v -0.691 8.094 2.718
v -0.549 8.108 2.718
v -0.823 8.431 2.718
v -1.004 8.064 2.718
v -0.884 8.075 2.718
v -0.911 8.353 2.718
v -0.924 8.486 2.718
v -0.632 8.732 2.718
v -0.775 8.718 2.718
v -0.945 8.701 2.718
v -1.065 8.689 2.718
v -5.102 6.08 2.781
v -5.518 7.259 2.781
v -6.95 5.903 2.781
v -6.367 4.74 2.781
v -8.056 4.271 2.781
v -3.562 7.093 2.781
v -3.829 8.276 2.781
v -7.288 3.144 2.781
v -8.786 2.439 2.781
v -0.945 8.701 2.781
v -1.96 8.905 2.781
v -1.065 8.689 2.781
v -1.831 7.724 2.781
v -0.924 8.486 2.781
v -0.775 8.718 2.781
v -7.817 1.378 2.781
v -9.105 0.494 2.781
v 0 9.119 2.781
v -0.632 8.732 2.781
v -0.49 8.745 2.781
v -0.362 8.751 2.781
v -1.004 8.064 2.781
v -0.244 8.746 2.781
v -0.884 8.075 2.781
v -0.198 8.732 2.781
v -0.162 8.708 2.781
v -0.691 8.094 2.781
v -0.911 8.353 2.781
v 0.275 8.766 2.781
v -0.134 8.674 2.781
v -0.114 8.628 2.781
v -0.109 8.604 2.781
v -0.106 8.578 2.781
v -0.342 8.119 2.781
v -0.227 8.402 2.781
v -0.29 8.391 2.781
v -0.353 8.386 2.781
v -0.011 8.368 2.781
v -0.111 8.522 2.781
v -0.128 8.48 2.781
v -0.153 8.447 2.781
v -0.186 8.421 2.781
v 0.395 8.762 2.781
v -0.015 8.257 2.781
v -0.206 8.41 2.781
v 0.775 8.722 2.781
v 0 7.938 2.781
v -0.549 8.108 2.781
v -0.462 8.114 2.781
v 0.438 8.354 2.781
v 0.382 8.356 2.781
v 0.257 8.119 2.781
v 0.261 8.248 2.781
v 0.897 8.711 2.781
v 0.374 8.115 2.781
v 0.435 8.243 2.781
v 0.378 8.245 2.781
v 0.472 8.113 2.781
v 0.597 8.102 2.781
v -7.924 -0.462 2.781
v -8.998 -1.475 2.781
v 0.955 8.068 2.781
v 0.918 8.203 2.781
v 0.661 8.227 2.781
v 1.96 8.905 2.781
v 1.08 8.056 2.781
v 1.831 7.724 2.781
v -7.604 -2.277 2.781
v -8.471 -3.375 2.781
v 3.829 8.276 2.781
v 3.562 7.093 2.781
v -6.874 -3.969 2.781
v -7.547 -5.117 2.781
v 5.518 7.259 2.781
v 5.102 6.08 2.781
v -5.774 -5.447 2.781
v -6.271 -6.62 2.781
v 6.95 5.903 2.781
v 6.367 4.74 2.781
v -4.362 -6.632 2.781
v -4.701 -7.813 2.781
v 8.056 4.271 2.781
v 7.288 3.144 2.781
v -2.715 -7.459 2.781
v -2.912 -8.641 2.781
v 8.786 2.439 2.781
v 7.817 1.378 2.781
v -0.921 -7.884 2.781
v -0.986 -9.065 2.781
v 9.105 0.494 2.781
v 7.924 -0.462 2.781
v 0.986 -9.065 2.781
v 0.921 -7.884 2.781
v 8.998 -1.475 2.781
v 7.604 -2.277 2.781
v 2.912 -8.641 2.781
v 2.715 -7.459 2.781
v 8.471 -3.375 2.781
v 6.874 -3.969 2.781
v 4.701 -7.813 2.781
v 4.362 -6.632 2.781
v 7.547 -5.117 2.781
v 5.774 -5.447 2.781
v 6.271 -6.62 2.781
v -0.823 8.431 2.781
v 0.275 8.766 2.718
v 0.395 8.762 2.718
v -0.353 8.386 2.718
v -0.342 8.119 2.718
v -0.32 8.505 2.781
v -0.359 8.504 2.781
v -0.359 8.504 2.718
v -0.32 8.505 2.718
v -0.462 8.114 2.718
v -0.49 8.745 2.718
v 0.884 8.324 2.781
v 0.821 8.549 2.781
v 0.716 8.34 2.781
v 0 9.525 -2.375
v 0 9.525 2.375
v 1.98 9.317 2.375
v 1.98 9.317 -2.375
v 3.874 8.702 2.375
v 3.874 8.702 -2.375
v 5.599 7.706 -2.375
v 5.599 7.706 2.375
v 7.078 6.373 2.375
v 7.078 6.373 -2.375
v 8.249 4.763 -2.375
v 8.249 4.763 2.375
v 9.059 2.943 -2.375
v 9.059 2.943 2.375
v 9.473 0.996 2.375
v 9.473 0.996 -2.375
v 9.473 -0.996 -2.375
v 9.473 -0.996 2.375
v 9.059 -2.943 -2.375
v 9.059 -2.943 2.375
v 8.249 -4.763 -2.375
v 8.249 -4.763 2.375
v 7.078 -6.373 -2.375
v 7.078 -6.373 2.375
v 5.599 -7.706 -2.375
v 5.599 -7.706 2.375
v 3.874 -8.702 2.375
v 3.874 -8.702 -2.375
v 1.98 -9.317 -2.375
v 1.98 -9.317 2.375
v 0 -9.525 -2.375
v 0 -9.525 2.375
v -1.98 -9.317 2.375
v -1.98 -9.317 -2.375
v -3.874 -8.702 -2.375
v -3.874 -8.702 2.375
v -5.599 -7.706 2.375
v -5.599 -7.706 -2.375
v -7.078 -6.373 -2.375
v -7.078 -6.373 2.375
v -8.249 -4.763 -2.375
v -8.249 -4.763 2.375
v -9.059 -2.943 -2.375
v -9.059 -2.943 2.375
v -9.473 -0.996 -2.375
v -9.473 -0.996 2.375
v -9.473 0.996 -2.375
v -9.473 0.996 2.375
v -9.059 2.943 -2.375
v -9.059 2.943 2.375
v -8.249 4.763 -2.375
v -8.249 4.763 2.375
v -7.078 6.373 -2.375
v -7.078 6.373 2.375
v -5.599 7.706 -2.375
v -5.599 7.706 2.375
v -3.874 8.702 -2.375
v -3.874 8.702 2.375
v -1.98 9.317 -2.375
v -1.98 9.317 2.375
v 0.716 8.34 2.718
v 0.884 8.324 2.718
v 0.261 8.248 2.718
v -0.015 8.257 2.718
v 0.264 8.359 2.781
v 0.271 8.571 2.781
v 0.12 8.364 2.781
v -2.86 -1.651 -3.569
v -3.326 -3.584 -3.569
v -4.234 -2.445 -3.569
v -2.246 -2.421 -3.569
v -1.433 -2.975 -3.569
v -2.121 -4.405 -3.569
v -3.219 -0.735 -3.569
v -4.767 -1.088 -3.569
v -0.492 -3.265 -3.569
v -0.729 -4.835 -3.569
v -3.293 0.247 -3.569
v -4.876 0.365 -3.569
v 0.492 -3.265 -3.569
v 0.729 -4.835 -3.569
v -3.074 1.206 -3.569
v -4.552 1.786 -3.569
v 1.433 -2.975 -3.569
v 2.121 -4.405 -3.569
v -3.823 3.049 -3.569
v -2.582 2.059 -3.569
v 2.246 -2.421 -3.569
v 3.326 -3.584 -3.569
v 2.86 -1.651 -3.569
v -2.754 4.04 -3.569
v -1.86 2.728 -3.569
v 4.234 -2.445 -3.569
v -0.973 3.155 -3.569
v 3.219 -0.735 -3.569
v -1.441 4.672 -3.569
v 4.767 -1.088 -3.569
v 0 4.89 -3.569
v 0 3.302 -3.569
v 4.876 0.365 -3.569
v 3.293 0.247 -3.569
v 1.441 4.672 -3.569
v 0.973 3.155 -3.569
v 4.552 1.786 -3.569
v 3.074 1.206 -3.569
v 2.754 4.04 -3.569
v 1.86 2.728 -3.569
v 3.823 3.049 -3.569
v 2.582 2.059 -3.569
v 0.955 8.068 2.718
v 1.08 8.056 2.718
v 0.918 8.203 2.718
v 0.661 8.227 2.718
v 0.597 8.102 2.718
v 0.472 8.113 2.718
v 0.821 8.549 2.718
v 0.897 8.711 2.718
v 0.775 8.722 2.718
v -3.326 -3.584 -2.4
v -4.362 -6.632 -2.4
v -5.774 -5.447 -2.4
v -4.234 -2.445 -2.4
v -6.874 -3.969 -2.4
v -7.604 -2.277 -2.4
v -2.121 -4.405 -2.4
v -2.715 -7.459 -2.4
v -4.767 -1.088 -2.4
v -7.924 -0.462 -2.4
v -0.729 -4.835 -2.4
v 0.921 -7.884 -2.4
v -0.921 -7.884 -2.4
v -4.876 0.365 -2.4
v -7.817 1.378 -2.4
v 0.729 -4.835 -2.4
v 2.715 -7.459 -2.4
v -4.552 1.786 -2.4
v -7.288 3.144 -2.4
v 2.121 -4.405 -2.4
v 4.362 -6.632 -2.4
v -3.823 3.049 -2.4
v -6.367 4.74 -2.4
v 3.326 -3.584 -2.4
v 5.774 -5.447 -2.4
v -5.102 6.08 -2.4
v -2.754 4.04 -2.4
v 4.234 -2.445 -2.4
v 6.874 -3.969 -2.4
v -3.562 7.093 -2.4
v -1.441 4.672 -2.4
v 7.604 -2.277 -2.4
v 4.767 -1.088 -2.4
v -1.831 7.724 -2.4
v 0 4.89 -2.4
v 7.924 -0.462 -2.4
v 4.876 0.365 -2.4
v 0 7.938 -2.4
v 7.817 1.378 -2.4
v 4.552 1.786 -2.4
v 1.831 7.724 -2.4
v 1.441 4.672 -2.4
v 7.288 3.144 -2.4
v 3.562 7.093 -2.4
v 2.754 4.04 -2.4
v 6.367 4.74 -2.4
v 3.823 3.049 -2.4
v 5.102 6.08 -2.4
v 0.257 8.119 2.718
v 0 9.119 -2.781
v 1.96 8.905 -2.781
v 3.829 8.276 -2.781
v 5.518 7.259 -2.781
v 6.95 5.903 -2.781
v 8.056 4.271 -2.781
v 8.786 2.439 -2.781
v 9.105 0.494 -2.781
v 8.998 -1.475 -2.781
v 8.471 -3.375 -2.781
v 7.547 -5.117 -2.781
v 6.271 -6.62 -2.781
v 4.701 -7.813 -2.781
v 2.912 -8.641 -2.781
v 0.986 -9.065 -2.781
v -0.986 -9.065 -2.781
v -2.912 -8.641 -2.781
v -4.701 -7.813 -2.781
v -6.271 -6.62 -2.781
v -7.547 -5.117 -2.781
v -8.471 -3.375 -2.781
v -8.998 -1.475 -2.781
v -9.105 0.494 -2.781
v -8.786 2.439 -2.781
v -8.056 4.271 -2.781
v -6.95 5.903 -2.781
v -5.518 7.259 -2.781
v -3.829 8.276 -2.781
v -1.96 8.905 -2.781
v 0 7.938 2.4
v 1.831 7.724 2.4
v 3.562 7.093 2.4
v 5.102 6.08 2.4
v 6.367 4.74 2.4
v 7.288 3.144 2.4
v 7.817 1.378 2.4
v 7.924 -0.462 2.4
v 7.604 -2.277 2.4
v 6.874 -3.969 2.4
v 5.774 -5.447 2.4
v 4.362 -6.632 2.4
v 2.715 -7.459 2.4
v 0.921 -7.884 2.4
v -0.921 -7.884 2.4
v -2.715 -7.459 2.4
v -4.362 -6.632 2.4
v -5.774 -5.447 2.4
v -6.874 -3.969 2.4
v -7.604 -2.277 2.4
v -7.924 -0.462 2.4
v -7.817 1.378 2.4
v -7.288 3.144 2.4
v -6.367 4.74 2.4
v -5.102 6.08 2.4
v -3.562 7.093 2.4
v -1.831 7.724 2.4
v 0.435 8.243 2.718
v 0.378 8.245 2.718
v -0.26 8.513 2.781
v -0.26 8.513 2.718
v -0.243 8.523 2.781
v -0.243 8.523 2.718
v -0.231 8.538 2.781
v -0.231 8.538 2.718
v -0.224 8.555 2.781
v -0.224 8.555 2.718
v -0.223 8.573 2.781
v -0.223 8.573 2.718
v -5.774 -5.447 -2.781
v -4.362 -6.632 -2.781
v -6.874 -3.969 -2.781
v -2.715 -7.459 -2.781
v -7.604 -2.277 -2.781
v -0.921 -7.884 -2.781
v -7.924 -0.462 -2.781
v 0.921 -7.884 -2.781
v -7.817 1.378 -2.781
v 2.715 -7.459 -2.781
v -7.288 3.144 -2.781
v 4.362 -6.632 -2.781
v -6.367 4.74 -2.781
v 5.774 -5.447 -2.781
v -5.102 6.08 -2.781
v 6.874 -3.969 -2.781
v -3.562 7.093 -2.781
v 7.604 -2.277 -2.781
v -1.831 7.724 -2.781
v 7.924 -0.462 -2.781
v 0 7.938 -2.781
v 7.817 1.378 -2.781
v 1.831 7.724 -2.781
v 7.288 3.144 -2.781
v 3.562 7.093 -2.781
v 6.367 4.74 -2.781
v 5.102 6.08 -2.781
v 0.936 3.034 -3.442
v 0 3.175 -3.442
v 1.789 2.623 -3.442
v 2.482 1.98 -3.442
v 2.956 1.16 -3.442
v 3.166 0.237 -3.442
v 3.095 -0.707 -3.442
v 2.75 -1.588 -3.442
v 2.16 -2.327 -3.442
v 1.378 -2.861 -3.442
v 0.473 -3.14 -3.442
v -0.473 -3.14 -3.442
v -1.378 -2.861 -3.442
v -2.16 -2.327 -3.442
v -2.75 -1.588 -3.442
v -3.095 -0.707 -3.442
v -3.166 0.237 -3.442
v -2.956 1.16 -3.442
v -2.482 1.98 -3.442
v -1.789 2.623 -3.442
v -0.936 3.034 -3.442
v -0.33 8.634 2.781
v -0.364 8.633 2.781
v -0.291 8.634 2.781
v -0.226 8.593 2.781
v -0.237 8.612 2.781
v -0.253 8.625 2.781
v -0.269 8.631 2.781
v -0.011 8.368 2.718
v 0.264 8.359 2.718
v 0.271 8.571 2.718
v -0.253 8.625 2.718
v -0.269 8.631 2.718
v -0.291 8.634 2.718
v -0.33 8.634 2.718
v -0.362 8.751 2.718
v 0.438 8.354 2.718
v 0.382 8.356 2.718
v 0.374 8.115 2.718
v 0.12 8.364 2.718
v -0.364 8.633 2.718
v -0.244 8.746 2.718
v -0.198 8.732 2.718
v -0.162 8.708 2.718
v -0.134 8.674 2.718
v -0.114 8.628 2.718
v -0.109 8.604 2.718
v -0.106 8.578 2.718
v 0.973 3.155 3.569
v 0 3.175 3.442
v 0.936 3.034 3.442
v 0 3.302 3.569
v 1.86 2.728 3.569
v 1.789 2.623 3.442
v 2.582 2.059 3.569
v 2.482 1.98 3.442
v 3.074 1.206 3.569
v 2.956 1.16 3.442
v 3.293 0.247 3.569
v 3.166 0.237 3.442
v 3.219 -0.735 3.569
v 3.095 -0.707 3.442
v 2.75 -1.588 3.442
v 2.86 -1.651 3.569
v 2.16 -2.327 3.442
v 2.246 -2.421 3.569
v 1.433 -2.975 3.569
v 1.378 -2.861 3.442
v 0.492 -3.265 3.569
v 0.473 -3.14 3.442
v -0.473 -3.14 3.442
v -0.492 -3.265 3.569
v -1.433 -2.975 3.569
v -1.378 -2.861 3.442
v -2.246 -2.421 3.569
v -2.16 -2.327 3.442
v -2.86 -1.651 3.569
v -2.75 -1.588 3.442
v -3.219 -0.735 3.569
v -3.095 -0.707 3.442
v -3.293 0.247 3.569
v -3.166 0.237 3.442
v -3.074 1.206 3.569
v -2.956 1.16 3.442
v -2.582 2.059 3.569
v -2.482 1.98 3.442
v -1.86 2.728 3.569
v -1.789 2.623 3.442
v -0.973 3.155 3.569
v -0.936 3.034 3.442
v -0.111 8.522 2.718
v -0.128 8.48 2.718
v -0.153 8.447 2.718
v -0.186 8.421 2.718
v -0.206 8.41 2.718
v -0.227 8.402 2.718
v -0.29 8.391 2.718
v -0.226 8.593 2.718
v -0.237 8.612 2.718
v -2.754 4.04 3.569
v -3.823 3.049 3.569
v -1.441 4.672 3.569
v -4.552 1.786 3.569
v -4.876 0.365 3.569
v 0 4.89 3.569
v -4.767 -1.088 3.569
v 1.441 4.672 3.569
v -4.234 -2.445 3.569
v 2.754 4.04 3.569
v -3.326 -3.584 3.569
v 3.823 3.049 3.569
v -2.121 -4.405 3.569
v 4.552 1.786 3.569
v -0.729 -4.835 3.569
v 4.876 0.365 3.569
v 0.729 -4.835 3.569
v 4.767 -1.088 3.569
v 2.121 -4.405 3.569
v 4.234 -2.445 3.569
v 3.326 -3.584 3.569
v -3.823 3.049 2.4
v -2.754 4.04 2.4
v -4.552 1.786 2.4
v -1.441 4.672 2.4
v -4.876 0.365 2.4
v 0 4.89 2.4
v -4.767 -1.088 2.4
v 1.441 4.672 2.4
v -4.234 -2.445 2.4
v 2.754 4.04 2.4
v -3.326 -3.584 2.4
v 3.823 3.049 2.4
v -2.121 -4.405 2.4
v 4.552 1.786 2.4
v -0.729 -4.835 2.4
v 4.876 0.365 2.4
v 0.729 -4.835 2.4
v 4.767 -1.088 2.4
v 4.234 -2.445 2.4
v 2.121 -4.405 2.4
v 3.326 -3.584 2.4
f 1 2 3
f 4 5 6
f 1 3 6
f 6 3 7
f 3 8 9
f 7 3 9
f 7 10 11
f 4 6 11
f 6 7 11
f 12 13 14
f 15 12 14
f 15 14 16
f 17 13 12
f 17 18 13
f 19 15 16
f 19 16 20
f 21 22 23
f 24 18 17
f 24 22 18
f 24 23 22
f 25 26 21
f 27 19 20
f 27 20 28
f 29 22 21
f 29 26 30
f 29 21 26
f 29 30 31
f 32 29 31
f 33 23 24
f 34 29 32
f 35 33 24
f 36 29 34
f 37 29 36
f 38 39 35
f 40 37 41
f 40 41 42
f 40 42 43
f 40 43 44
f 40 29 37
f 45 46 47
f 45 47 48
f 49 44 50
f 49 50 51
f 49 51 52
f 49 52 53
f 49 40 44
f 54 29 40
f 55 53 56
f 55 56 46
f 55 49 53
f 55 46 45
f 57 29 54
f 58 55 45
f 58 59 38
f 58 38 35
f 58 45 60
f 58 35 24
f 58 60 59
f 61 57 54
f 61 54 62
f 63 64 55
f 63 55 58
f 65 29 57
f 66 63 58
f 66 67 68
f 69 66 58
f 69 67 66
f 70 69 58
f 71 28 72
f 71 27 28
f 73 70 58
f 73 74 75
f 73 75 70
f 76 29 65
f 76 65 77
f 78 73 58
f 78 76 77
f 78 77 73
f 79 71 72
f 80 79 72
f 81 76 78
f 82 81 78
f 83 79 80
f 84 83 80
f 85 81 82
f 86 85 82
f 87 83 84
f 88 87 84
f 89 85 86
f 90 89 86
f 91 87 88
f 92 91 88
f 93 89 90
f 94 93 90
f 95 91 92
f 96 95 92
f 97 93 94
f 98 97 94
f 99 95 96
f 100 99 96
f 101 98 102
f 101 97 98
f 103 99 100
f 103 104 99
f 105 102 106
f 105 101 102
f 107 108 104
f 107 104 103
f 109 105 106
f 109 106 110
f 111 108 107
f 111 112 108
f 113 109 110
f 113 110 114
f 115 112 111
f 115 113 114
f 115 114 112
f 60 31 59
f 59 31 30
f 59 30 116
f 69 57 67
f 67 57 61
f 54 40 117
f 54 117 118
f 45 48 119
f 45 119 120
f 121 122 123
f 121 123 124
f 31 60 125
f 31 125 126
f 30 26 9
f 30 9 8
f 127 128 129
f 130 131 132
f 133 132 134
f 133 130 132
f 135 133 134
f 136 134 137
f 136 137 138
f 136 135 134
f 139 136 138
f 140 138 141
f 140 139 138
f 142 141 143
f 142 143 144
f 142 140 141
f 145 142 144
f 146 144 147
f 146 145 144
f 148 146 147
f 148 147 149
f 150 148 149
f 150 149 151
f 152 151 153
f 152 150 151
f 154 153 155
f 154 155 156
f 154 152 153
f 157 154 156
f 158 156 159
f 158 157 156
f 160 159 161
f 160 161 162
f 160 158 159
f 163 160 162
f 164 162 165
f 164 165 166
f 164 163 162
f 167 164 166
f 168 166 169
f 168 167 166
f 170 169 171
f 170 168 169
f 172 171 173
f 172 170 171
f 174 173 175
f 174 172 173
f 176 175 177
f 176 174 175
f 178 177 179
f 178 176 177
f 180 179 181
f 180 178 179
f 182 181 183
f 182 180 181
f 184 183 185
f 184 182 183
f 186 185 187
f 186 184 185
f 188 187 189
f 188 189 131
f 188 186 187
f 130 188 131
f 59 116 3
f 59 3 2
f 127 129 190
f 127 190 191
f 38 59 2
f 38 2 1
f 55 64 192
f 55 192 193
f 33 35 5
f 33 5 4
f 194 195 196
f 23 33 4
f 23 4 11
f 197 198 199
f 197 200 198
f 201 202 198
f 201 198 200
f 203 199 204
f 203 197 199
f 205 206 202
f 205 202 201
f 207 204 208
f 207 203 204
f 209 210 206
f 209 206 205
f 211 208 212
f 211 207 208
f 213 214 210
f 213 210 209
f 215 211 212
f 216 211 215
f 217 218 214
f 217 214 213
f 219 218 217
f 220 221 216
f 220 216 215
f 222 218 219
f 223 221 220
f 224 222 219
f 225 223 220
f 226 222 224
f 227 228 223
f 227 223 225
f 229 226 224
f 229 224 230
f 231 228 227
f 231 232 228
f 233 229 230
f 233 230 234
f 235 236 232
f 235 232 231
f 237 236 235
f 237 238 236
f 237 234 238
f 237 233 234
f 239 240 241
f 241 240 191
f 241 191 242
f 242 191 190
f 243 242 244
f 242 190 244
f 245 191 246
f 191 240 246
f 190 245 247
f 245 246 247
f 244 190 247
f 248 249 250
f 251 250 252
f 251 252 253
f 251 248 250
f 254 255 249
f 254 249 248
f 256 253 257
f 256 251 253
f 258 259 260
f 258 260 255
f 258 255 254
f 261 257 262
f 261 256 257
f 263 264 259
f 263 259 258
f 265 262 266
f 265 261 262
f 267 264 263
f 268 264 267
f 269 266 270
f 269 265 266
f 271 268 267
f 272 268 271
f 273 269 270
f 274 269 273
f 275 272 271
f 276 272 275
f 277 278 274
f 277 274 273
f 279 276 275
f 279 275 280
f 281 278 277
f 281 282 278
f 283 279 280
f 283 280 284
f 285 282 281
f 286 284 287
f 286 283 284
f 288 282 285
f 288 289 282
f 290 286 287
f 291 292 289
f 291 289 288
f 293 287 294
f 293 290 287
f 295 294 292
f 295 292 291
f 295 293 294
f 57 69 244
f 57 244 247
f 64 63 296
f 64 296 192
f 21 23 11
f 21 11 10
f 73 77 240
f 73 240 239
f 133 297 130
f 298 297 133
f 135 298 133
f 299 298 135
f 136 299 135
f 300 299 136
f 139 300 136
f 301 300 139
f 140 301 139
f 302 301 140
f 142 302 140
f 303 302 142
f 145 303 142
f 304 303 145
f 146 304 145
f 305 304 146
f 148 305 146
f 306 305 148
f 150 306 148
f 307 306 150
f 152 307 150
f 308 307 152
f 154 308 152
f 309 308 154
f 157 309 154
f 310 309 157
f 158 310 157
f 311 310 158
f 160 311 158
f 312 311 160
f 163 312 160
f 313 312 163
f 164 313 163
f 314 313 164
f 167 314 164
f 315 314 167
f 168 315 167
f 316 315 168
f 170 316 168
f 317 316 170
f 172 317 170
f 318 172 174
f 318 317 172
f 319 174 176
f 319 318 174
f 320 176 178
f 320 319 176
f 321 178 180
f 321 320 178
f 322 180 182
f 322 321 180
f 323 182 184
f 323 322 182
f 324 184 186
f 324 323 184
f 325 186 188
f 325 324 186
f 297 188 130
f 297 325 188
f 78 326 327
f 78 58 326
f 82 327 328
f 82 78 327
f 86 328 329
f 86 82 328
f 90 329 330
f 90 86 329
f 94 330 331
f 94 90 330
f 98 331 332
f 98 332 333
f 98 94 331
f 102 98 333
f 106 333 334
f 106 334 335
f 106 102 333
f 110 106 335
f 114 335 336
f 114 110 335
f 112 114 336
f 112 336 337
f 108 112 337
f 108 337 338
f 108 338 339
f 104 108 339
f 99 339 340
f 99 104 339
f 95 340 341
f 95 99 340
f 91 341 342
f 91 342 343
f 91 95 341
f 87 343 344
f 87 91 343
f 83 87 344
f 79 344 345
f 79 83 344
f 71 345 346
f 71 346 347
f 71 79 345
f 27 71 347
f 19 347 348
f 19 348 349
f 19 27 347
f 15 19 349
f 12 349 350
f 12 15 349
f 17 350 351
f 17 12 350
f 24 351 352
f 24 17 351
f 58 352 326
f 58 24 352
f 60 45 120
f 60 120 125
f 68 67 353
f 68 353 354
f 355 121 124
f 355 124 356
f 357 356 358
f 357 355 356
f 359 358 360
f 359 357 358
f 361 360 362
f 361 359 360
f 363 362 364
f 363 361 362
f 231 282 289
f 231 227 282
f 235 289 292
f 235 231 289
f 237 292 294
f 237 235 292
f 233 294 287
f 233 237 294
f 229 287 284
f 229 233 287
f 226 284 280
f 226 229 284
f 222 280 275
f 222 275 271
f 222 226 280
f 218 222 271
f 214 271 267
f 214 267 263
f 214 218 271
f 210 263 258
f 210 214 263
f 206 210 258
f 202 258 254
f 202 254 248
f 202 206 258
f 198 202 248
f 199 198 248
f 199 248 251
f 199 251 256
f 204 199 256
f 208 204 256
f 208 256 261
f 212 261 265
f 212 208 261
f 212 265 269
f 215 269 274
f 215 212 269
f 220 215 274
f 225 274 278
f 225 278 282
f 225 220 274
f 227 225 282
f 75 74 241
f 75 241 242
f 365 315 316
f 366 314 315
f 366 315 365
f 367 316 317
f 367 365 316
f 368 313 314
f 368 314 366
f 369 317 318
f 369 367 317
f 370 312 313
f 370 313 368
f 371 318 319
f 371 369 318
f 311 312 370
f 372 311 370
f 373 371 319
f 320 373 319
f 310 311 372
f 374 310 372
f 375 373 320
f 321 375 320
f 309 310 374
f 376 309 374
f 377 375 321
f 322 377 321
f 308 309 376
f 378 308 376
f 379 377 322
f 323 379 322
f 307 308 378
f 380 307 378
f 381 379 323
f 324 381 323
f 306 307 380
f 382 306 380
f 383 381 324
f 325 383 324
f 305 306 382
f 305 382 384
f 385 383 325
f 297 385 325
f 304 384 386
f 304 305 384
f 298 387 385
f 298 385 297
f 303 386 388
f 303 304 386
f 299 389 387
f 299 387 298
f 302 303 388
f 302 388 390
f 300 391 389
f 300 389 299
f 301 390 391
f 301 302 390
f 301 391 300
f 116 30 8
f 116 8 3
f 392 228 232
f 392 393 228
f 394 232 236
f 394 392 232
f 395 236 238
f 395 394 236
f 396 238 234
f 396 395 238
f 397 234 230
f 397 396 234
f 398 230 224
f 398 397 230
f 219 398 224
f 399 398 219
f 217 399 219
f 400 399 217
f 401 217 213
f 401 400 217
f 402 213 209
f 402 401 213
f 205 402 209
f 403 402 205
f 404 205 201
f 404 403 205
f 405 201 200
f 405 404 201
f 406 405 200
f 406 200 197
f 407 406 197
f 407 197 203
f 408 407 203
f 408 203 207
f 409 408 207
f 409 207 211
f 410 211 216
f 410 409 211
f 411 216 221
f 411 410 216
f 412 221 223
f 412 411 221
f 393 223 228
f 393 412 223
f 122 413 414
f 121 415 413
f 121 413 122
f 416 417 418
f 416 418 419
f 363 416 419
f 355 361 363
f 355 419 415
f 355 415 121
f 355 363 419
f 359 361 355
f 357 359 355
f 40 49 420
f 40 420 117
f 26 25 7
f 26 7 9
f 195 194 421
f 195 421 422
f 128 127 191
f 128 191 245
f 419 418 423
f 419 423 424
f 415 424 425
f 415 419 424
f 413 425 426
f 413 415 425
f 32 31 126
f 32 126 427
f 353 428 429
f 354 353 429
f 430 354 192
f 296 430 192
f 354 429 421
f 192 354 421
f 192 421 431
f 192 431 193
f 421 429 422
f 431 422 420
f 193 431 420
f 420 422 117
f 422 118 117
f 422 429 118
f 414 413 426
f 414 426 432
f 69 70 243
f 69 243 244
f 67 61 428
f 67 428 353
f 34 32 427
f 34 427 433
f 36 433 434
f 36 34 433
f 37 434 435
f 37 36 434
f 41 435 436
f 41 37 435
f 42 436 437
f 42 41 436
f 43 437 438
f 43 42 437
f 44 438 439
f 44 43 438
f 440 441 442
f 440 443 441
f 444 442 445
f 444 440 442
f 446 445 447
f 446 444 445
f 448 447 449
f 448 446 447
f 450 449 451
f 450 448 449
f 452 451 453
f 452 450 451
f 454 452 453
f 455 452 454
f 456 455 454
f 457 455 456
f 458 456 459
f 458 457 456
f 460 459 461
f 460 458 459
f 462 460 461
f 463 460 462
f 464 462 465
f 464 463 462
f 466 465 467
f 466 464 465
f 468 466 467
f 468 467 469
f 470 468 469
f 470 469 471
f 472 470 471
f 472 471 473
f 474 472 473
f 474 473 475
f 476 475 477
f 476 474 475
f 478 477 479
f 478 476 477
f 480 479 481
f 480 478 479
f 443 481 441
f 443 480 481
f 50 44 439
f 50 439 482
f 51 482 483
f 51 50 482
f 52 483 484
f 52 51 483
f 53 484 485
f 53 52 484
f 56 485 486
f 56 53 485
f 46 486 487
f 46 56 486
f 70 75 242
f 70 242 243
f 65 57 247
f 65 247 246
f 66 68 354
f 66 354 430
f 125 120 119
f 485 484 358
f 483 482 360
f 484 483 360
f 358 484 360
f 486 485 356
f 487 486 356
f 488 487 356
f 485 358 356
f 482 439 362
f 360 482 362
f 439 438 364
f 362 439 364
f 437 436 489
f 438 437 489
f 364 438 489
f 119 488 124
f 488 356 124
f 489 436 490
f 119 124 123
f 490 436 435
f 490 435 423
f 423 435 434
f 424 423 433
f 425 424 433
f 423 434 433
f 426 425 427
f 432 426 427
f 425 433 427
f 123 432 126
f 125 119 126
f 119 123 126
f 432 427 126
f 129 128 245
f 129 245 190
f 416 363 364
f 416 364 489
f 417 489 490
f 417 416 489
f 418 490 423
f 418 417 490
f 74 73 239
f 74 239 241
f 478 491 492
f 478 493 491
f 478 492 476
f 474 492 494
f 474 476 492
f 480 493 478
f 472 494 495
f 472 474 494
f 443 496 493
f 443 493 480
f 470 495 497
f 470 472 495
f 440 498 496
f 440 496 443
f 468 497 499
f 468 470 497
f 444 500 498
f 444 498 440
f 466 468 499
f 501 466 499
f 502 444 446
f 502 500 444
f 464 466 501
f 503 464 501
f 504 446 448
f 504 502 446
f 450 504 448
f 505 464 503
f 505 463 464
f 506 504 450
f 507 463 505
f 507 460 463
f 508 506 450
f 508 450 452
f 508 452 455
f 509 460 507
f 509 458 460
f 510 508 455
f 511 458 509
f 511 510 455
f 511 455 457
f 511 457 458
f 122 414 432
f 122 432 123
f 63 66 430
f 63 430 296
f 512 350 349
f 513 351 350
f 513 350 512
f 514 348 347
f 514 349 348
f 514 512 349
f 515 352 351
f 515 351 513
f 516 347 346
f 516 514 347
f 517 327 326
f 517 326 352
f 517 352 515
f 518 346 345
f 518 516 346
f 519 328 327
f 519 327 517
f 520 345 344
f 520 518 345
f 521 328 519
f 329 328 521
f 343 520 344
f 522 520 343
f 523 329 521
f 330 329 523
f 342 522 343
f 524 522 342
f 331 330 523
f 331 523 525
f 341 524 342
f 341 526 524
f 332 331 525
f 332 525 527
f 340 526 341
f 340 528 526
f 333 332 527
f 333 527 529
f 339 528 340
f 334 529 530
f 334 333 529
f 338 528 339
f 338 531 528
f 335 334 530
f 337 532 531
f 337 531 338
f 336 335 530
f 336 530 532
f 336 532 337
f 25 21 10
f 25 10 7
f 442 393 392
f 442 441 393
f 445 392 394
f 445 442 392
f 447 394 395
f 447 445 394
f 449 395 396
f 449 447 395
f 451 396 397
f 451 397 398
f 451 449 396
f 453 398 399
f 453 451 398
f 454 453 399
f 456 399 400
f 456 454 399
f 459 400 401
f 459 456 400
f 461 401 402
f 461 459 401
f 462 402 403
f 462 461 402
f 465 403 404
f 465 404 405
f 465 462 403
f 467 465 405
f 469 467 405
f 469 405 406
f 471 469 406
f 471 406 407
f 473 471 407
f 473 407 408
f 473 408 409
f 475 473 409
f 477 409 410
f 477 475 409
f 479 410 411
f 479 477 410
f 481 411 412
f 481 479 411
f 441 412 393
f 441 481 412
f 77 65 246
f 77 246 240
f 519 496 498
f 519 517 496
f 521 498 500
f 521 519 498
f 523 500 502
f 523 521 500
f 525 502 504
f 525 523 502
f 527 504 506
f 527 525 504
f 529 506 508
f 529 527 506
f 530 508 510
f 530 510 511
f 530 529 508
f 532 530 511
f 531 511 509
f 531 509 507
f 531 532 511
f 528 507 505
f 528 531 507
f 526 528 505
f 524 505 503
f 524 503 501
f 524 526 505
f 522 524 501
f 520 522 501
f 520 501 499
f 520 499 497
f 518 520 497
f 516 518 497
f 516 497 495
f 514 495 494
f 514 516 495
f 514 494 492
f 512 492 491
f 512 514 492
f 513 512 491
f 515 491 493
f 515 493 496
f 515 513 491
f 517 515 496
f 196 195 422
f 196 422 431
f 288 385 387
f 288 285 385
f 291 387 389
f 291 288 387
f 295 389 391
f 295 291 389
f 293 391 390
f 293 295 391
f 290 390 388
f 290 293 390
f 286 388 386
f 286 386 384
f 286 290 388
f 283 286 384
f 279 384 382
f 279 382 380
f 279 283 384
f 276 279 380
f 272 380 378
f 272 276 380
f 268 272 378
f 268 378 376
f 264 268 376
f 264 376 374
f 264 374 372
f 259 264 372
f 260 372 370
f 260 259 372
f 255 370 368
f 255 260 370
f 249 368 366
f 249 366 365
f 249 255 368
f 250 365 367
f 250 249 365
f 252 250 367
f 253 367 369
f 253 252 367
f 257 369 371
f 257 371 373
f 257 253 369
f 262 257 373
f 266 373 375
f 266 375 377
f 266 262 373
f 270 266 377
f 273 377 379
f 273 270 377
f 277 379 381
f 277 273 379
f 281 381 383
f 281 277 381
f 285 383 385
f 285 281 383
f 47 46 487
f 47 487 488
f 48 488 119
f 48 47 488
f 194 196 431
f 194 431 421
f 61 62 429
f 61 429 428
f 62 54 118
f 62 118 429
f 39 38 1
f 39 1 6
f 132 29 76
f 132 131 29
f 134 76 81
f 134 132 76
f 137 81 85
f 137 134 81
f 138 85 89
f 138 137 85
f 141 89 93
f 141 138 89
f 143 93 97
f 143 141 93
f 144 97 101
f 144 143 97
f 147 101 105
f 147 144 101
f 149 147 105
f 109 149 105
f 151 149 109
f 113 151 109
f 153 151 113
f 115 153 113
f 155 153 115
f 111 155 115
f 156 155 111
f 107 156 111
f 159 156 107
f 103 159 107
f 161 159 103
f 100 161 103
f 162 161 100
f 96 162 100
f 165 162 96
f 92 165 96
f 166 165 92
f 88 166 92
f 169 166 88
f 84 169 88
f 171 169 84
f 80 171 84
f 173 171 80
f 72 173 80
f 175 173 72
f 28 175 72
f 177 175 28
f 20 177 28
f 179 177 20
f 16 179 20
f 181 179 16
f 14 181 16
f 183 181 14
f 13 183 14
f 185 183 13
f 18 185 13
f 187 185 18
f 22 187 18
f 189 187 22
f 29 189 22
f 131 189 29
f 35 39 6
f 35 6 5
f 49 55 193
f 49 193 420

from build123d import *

# Parameters (mm, degrees)
CUT_EXTRUDE1_DEPTH = 0.0635


with BuildPart() as part:
    # Sketch1 → Revolve1 (revolve)
    with BuildSketch(Plane(origin=(0, 0, 0), x_dir=(0, 0, -1), z_dir=(1, 0, 0))):
        Polygon((-3.5687, 3.302), (-3.5687, 4.8895), (-2.4003, 4.8895), (-2.4003, 7.9375), (-2.7813, 7.9375), (-2.7813, 9.1186), (-2.3749, 9.525), (2.3749, 9.525), (2.7813, 9.1186), (2.7813, 7.9375), (2.4003, 7.9375), (2.4003, 4.8895), (3.5687, 4.8895), (3.5687, 3.302), (3.4417, 3.175), (-3.4417, 3.175), align=None)
    revolve(axis=Axis((0, 0, 0), (0, 0, -1)))

    # Sketch2 → Cut-Extrude1 (cut)
    with BuildSketch(Plane.XY.offset(2.7813)):
        Polygon((-1.065389716, 8.689257304), (-0.944927977, 8.700960028), (-0.923812192, 8.485731663), (-0.775238474, 8.71762369), (-0.6318801, 8.731743282), (-0.823194203, 8.43116135), (-0.549325012, 8.108064395), (-0.690520926, 8.094199211), (-0.910837432, 8.352931182), (-0.883615878, 8.075245886), (-1.004077616, 8.063543161), align=None)
        with BuildLine():
            Line((-0.489550779, 8.745205417), (-0.362092846, 8.750802372))
            add(Edge.make_bspline(
                [(-0.362092846, 8.750802372), (-0.353783496, 8.751094885), (-0.337719442, 8.751660387), (-0.314512555, 8.751859917), (-0.293097259, 8.751130036), (-0.273426615, 8.750177126), (-0.25557832, 8.748042626), (-0.239408839, 8.745617462), (-0.225080822, 8.742341467), (-0.212298345, 8.738378299), (-0.200823557, 8.733485202), (-0.189914069, 8.728251603), (-0.179779185, 8.721890908), (-0.169997559, 8.715093426), (-0.160982847, 8.707235014), (-0.152469707, 8.698745309), (-0.144499674, 8.68948952), (-0.137163657, 8.679508609), (-0.130573946, 8.668808831), (-0.124668367, 8.657561061), (-0.119619418, 8.645720508), (-0.115250492, 8.633375845), (-0.111835881, 8.620431699), (-0.109185181, 8.606920008), (-0.107217999, 8.592822714), (-0.106684397, 8.583196649), (-0.106413759, 8.578314391)],
                knots=[0, 0, 0, 0, 2.4944e-05, 4.8222e-05, 6.9602e-05, 8.9225e-05, 0.000107275, 0.000123504, 0.000138253, 0.000151328, 0.000163588, 0.000175649, 0.000187582, 0.000199441, 0.000211348, 0.000223401, 0.000235488, 0.000247954, 0.000260521, 0.000273152, 0.00028603, 0.000299104, 0.000312403, 0.000326149, 0.000340397, 0.00035506, 0.00035506, 0.00035506, 0.00035506], degree=3))
            add(Edge.make_bspline(
                [(-0.106413759, 8.578314391), (-0.106301145, 8.57292907), (-0.106079291, 8.562319767), (-0.106956067, 8.546709533), (-0.108985222, 8.531734852), (-0.112150836, 8.517427274), (-0.116516958, 8.503788963), (-0.121841952, 8.490732201), (-0.128357362, 8.47833375), (-0.136015471, 8.466683627), (-0.144501712, 8.455688158), (-0.154040626, 8.445647342), (-0.164159304, 8.436201955), (-0.175157805, 8.427603876), (-0.187090246, 8.420035009), (-0.19964346, 8.412982658), (-0.213097771, 8.406836734), (-0.222481909, 8.403469396), (-0.227257109, 8.401755898)],
                knots=[0, 0, 0, 0, 1.6155e-05, 3.1827e-05, 4.6848e-05, 6.1445e-05, 7.5727e-05, 8.9758e-05, 0.000103699, 0.00011767, 0.000131538, 0.000145307, 0.000159169, 0.000173037, 0.000187115, 0.000201521, 0.000216207, 0.000231422, 0.000231422, 0.000231422, 0.000231422], degree=3))
            add(Edge.make_bspline(
                [(-0.227257109, 8.401755898), (-0.230428994, 8.40083463), (-0.237276115, 8.398845897), (-0.248567522, 8.396319688), (-0.261647847, 8.394081399), (-0.276541992, 8.392071054), (-0.293213358, 8.390303809), (-0.3117114, 8.388833395), (-0.331976204, 8.387396251), (-0.346105902, 8.38671699), (-0.353443006, 8.386364271)],
                knots=[0, 0, 0, 0, 9.907e-06, 2.1387e-05, 3.4687e-05, 4.9708e-05, 6.6467e-05, 8.4975e-05, 0.000105375, 0.000127411, 0.000127411, 0.000127411, 0.000127411], degree=3))
            Line((-0.353443006, 8.386364271), (-0.341740282, 8.118855257))
            Line((-0.341740282, 8.118855257), (-0.461947614, 8.113639912))
            Line((-0.461947614, 8.113639912), (-0.489550779, 8.745205417))
        make_face()
        with BuildLine():
            Line((-0.358531147, 8.503518718), (-0.32037009, 8.505172364))
            add(Edge.make_bspline(
                [(-0.32037009, 8.505172364), (-0.313456644, 8.505592798), (-0.300711051, 8.506367909), (-0.283338162, 8.508066241), (-0.269442305, 8.510743628), (-0.258483675, 8.513806757), (-0.249827521, 8.518175494), (-0.242563252, 8.523364305), (-0.236339925, 8.529632522), (-0.231078239, 8.53675751), (-0.227040183, 8.54486288), (-0.224012592, 8.553649742), (-0.222695566, 8.563264025), (-0.222683841, 8.569831817), (-0.222677782, 8.57322625)],
                knots=[0, 0, 0, 0, 2.0781e-05, 3.8312e-05, 5.2308e-05, 6.3212e-05, 7.2314e-05, 8.1246e-05, 8.9881e-05, 9.8709e-05, 0.000107697, 0.000116949, 0.000126466, 0.000136645, 0.000136645, 0.000136645, 0.000136645], degree=3))
            add(Edge.make_bspline(
                [(-0.222677782, 8.57322625), (-0.222917637, 8.576158471), (-0.22338335, 8.581851802), (-0.224998846, 8.590031341), (-0.227597902, 8.59754684), (-0.23099774, 8.604406251), (-0.235304004, 8.610636746), (-0.240375218, 8.61626779), (-0.246452189, 8.62116902), (-0.251005053, 8.62378647), (-0.253333831, 8.625125289)],
                knots=[0, 0, 0, 0, 8.822e-06, 1.7129e-05, 2.4933e-05, 3.2613e-05, 4.0023e-05, 4.7587e-05, 5.5275e-05, 6.3325e-05, 6.3325e-05, 6.3325e-05, 6.3325e-05], degree=3))
            add(Edge.make_bspline(
                [(-0.253333831, 8.625125289), (-0.255266589, 8.626057529), (-0.259374974, 8.628039155), (-0.266333987, 8.630303419), (-0.274399852, 8.632008988), (-0.283527412, 8.633423979), (-0.293729577, 8.634232301), (-0.304971839, 8.634778726), (-0.31732103, 8.634719634), (-0.325925391, 8.634433422), (-0.330419168, 8.634283942)],
                knots=[0, 0, 0, 0, 6.432e-06, 1.3673e-05, 2.1882e-05, 3.1147e-05, 4.1362e-05, 5.2568e-05, 6.4906e-05, 7.8395e-05, 7.8395e-05, 7.8395e-05, 7.8395e-05], degree=3))
            Line((-0.330419168, 8.634283942), (-0.364255306, 8.6327575))
            Line((-0.364255306, 8.6327575), (-0.358531147, 8.503518718))
        make_face(mode=Mode.SUBTRACT)
        Polygon((0.274619381, 8.766223521), (0.394826713, 8.762407416), (0.381979157, 8.355737744), (0.438203115, 8.353956895), (0.434641417, 8.242781013), (0.378417458, 8.244561863), (0.374346945, 8.11494147), (0.256810888, 8.118630372), (0.260881401, 8.248250765), (-0.01476864, 8.257027808), (-0.011206941, 8.36820369), align=None)
        Polygon((0.264443099, 8.359426646), (0.271057683, 8.571093313), (0.120194301, 8.364005973), align=None, mode=Mode.SUBTRACT)
        Polygon((0.774863847, 8.722125534), (0.896852028, 8.710550013), (1.080152309, 8.056087873), (0.955238446, 8.067790598), (0.91822222, 8.202626335), (0.660635081, 8.226922208), (0.596778911, 8.101753939), (0.471737845, 8.113456663), align=None)
        Polygon((0.820911523, 8.548747128), (0.716350225, 8.339878939), (0.884131675, 8.323978498), align=None, mode=Mode.SUBTRACT)
    extrude(amount=-CUT_EXTRUDE1_DEPTH, mode=Mode.SUBTRACT)


solid = part.part
